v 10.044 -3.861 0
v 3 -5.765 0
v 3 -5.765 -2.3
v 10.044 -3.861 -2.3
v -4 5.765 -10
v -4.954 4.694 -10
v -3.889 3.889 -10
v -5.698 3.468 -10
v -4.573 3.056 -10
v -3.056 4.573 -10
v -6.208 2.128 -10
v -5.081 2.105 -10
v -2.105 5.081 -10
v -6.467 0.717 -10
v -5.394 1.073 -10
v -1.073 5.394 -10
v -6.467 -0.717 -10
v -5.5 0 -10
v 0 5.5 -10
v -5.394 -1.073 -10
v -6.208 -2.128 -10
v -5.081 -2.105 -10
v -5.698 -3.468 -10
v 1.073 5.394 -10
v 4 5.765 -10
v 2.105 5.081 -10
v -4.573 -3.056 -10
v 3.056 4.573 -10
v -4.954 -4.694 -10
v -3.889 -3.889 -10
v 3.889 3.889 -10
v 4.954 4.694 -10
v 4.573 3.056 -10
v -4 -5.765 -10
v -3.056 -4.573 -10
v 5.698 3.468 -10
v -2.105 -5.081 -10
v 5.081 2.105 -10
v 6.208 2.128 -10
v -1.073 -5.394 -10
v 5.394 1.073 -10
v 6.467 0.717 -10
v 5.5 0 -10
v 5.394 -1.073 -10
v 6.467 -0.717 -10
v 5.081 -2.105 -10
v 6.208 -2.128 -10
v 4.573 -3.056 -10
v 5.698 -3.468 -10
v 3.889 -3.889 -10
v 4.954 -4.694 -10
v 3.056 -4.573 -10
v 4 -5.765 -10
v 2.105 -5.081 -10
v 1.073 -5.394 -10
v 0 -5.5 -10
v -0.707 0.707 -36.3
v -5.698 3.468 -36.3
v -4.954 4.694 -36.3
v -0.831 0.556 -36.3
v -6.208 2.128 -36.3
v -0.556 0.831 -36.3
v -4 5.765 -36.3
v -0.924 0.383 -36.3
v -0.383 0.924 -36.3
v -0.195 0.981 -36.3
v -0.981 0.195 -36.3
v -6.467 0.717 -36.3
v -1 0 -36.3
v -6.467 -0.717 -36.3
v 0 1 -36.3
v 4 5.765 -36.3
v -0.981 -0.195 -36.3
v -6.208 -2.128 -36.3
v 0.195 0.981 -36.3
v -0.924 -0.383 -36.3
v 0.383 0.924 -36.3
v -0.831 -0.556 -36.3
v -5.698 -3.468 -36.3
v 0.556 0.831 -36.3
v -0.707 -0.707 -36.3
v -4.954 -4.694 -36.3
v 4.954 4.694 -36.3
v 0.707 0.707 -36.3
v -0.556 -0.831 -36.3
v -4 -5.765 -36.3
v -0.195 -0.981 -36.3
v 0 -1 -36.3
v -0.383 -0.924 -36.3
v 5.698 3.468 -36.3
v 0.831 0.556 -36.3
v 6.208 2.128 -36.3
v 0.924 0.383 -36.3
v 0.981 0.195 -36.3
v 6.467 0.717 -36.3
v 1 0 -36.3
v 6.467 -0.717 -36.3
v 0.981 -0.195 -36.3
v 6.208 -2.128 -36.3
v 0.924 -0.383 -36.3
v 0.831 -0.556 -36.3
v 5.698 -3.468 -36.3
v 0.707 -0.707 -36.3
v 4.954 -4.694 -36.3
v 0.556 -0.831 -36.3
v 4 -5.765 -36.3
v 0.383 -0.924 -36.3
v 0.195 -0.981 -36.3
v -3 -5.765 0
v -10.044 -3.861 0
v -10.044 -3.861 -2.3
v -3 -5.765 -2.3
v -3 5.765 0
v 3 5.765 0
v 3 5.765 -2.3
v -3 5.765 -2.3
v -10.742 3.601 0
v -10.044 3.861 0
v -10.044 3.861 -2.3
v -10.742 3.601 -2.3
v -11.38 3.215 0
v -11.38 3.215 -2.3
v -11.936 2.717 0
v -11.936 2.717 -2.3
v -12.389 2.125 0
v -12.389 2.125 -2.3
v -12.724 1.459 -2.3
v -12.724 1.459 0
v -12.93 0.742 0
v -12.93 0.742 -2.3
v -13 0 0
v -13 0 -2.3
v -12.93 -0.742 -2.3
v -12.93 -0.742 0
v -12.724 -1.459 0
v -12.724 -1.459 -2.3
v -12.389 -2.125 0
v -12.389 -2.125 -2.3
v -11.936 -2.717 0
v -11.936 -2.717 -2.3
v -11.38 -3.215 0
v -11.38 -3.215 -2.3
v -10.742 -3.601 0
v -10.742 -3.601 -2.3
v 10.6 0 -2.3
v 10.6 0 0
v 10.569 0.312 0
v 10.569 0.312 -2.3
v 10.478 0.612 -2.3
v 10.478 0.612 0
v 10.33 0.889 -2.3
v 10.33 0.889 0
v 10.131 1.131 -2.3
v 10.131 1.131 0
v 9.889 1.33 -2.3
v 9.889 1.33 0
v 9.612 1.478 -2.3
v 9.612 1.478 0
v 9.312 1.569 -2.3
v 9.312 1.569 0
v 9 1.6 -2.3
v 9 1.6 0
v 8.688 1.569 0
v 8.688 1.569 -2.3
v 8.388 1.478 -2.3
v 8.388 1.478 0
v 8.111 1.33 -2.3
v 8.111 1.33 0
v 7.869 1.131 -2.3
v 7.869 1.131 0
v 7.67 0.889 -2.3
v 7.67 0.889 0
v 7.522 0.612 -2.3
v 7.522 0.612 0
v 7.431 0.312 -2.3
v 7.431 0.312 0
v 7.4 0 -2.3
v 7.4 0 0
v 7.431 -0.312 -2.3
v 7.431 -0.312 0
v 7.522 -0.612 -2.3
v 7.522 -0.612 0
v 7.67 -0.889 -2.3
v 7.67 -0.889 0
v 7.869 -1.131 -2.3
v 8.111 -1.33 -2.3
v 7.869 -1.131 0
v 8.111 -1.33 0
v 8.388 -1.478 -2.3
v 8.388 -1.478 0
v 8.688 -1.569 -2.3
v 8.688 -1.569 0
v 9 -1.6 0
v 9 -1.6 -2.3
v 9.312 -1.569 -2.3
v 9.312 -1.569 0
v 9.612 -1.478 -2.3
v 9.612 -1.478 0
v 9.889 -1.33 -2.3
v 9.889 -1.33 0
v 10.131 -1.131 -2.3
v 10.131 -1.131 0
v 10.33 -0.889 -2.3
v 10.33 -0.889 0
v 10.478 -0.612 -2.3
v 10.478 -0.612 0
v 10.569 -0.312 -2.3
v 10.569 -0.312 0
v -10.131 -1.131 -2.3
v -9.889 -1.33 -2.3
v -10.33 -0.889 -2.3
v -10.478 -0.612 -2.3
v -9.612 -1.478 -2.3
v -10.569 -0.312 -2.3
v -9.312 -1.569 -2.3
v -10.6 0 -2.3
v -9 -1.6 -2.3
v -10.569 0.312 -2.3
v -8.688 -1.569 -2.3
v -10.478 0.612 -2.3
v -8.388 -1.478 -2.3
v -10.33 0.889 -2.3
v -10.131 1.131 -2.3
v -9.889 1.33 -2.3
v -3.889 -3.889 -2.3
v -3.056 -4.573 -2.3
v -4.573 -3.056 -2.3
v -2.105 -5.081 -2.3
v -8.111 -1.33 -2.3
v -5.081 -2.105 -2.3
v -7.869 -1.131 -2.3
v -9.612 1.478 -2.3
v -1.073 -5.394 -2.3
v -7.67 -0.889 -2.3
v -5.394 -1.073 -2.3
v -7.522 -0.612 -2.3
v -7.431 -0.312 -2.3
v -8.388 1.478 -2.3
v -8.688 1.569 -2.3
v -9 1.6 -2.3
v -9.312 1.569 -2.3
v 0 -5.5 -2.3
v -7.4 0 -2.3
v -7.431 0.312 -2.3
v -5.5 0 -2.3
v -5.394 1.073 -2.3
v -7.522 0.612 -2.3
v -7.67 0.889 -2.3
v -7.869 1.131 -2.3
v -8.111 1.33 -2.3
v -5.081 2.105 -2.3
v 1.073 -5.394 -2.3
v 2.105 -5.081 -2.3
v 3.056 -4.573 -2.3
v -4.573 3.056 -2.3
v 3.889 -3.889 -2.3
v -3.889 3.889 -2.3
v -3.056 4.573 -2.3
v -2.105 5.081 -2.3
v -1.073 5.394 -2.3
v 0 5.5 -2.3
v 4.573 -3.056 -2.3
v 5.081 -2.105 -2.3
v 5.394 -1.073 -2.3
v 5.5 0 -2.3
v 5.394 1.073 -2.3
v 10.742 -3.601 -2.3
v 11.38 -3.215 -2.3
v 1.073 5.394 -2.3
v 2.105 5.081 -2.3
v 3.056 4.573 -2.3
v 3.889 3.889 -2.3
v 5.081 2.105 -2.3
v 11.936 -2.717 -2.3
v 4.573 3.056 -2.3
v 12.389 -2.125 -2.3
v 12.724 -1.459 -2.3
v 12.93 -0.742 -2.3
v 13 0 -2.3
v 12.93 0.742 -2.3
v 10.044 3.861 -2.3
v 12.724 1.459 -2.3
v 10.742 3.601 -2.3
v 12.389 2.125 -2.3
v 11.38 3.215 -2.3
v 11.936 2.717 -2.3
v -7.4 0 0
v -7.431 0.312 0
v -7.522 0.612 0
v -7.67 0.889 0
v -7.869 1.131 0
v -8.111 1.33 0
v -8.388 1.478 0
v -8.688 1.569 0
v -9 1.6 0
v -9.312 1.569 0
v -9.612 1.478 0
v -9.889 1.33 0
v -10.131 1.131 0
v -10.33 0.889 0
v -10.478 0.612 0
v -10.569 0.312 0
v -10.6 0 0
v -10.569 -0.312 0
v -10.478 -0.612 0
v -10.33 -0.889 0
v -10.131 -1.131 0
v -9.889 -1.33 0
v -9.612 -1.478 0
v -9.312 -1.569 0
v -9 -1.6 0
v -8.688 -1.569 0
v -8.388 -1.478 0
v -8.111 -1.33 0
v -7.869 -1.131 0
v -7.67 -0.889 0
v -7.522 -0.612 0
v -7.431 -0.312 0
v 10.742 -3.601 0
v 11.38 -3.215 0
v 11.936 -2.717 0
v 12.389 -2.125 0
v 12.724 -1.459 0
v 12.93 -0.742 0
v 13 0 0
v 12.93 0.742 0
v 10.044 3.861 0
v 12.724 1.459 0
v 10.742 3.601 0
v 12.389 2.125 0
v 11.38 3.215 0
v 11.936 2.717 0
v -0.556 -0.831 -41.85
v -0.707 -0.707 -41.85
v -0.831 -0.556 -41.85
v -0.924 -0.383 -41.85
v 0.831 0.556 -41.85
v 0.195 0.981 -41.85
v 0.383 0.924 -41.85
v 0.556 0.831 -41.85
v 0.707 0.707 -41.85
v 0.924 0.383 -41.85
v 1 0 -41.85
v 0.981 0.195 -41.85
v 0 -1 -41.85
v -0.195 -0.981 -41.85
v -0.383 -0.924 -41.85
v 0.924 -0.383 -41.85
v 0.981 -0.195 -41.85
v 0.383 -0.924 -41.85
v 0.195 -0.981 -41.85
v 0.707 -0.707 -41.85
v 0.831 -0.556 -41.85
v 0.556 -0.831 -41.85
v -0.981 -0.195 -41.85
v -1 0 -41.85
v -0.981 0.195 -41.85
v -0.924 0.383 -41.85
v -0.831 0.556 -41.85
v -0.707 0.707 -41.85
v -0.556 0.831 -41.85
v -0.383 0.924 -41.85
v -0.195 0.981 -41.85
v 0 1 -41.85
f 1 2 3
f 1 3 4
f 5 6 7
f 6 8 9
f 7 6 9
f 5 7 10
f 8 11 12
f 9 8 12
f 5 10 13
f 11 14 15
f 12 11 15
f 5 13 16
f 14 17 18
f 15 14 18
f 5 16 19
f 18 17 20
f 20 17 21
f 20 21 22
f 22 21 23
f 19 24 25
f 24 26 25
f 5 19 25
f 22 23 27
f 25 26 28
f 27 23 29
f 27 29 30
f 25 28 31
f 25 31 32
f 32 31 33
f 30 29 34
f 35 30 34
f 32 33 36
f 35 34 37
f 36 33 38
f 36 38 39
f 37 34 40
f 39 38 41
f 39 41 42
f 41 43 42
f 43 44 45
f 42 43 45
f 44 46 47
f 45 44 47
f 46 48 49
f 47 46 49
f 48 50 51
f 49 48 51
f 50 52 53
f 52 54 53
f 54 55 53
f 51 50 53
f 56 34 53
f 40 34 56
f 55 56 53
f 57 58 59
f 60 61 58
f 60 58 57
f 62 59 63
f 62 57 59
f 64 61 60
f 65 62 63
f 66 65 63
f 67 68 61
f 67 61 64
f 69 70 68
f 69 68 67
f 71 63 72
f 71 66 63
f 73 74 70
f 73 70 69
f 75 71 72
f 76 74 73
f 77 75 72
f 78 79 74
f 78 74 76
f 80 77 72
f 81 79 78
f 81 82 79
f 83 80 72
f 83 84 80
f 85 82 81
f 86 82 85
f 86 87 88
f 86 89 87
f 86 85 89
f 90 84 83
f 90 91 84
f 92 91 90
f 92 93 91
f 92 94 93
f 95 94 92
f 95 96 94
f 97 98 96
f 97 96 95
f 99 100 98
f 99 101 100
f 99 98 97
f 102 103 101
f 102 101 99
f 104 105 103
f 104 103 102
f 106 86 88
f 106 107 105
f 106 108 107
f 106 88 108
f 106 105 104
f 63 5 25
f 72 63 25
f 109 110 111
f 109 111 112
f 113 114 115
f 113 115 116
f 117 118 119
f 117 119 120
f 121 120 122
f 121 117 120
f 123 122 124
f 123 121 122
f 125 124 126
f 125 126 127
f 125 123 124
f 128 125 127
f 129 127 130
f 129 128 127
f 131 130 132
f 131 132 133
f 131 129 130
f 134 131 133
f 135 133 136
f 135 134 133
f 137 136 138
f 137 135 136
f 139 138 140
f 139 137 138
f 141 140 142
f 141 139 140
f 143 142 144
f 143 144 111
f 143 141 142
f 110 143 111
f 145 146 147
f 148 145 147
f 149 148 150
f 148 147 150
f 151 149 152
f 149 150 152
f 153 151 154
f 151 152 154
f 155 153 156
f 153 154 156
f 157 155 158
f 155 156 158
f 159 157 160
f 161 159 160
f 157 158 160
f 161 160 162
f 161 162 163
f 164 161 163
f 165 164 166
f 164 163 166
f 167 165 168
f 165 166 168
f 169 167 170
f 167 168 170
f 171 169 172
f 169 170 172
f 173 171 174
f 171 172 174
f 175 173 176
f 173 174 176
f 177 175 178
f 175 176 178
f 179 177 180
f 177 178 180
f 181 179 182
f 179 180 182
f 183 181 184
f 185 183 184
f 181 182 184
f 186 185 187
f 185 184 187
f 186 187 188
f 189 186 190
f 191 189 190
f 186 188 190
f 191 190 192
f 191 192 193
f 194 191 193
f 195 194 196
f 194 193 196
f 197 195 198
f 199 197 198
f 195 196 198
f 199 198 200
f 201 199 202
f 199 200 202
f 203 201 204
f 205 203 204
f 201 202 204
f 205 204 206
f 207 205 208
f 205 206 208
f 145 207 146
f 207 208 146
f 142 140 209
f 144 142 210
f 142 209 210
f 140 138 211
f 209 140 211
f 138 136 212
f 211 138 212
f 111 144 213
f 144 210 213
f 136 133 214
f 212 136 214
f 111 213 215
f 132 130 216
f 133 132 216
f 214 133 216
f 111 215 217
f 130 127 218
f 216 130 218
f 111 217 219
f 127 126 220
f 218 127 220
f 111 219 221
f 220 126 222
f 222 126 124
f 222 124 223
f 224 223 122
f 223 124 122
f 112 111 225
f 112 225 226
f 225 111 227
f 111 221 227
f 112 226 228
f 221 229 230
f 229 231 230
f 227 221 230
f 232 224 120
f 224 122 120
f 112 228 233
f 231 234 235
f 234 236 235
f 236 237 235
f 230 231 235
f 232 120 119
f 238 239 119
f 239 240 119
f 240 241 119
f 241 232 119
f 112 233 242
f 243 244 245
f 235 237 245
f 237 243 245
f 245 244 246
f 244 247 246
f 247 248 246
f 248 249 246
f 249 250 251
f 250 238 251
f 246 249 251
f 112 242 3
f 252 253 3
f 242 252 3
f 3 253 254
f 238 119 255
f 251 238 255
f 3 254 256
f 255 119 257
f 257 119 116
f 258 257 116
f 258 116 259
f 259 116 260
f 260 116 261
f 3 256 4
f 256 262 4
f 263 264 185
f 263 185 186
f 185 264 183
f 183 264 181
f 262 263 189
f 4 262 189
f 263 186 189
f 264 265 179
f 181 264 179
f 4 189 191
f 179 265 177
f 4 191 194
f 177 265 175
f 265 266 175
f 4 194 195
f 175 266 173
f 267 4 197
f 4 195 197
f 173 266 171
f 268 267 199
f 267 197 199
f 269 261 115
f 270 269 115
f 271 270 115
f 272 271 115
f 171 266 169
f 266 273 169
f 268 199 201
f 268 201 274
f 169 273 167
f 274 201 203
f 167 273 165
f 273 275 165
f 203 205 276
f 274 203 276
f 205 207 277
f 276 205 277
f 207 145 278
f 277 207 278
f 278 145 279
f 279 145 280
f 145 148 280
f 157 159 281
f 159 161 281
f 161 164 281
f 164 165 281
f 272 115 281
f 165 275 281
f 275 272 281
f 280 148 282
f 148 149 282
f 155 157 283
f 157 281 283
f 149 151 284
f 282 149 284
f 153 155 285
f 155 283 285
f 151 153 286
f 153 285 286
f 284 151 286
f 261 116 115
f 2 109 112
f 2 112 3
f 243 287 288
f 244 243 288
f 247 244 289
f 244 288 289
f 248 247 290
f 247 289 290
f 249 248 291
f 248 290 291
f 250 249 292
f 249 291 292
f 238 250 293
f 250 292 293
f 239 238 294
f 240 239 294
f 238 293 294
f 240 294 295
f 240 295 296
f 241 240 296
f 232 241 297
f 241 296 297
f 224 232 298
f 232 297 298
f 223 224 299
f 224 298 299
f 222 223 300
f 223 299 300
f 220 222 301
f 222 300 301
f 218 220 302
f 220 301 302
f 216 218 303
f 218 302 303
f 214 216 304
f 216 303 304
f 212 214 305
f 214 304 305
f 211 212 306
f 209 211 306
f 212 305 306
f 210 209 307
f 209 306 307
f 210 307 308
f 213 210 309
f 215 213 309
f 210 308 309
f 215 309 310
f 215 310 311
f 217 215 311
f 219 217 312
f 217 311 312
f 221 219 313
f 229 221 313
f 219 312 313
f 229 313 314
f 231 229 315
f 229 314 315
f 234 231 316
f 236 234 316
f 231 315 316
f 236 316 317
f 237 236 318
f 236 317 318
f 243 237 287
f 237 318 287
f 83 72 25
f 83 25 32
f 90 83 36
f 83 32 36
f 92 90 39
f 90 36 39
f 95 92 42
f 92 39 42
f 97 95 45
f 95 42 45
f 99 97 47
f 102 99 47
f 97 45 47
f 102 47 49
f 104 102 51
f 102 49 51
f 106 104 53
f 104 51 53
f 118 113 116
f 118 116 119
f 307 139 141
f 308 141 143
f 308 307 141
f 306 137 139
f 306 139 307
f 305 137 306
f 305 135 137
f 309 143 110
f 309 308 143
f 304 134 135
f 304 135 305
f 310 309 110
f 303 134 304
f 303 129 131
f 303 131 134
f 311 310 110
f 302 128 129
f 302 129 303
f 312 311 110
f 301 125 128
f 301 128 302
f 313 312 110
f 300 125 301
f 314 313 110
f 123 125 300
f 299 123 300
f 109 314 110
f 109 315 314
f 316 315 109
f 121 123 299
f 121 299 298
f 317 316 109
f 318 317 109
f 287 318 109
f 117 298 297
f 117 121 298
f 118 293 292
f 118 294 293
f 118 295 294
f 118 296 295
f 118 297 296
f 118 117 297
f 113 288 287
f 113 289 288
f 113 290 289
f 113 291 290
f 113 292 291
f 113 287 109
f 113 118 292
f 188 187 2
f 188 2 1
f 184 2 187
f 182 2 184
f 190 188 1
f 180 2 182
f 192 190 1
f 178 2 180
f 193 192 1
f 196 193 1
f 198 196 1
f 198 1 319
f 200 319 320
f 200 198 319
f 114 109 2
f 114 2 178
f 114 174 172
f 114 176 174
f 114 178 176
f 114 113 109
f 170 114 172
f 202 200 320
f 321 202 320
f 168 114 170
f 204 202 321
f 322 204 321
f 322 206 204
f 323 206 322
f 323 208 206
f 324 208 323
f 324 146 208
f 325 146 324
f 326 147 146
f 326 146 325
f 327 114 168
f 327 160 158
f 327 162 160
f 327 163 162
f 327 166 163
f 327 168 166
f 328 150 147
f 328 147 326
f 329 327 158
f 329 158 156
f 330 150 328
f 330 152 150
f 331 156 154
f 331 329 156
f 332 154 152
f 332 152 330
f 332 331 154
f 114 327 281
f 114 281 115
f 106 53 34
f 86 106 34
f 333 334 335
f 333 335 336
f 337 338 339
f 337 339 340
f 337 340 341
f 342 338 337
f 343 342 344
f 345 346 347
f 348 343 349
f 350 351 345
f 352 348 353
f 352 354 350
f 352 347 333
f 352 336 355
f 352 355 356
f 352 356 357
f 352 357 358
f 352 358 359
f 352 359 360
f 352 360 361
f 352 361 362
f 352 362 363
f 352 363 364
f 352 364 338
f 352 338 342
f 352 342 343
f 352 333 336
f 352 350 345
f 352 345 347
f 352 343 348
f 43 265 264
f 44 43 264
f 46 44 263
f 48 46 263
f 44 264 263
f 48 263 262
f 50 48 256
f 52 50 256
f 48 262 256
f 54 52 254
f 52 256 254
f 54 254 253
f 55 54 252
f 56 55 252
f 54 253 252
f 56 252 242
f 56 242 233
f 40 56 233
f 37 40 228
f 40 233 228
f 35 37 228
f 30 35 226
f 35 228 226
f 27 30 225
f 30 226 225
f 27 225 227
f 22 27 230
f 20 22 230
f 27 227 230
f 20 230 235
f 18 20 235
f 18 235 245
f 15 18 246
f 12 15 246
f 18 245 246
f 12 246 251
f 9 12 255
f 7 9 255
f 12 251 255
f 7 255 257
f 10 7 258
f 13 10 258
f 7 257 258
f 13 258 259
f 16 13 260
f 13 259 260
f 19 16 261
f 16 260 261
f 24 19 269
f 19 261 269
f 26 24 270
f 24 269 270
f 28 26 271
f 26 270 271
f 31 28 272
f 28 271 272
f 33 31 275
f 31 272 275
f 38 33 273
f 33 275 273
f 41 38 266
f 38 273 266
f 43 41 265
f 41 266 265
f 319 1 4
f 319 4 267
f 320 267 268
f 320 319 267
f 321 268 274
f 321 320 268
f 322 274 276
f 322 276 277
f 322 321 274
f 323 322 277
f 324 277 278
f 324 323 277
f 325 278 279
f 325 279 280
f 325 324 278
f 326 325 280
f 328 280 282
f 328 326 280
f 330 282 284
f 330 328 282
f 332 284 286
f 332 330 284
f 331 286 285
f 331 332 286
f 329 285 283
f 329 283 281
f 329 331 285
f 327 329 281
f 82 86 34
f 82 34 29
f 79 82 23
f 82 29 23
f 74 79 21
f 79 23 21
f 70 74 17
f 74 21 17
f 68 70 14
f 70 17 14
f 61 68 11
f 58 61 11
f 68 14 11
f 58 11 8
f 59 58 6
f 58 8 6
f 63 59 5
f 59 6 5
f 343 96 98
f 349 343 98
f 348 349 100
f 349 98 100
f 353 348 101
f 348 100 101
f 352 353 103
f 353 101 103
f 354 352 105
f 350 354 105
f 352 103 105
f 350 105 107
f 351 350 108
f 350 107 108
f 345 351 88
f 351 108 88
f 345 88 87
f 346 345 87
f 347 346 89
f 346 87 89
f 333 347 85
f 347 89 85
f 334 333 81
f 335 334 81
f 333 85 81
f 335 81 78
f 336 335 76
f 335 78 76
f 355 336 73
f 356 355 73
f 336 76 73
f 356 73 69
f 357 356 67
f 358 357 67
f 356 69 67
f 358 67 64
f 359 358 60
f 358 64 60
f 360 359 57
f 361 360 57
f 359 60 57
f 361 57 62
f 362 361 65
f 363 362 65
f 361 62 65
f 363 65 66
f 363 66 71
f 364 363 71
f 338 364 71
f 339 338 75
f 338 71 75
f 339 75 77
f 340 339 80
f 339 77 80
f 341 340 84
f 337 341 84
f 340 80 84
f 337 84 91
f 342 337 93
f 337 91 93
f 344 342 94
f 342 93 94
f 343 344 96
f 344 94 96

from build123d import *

# Parameters (mm, degrees)
F0_R     = 1.6
F1_DEPTH = 2.3
F2_R     = 5.5
F3_DEPTH = 7.7
F5_DEPTH = 26.3
F6_R     = 1
F7_DEPTH = 5.55


with BuildPart() as f1:
    # F0 (on Top) → F1 (new body)
    with BuildSketch(Plane.XY):
        with BuildLine():
            Line((3, 5.765), (-3, 5.765))
            Line((-3, 5.765), (-10.043565, 3.861473))
            ThreePointArc((-10.043565, 3.861473), (-13, 0), (-10.043565, -3.861473))
            Line((-10.043565, -3.861473), (-3, -5.765))
            Line((-3, -5.765), (3, -5.765))
            Line((3, -5.765), (10.043565, -3.861473))
            ThreePointArc((10.043565, -3.861473), (13, 0), (10.043565, 3.861473))
            Line((10.043565, 3.861473), (3, 5.765))
        make_face()
        with Locations((-9, 0)):
            Circle(F0_R, mode=Mode.SUBTRACT)
        with Locations((9, 0)):
            Circle(F0_R, mode=Mode.SUBTRACT)
    extrude(amount=-F1_DEPTH)

    # F2 (on face) → F3 (join)
    with BuildSketch(Plane(origin=(0, 0, -2.3), x_dir=(1, 0, 0), z_dir=(0, 0, -1))):
        Circle(F2_R)
    extrude(amount=F3_DEPTH)

    # F4 (on face) → F5 (join)
    with BuildSketch(Plane(origin=(0, 0, -10), x_dir=(1, 0, 0), z_dir=(0, 0, -1))):
        with BuildLine():
            Line((4, 5.765), (-4, 5.765))
            ThreePointArc((-4, 5.765), (-6.5, 0), (-4, -5.765))
            Line((-4, -5.765), (4, -5.765))
            ThreePointArc((4, -5.765), (6.5, 0), (4, 5.765))
        make_face()
    extrude(amount=F5_DEPTH)

    # F6 (on face) → F7 (join)
    with BuildSketch(Plane(origin=(0, 0, -36.3), x_dir=(1, 0, 0), z_dir=(0, 0, -1))):
        Circle(F6_R)
    extrude(amount=F7_DEPTH)


solid = f1.part
